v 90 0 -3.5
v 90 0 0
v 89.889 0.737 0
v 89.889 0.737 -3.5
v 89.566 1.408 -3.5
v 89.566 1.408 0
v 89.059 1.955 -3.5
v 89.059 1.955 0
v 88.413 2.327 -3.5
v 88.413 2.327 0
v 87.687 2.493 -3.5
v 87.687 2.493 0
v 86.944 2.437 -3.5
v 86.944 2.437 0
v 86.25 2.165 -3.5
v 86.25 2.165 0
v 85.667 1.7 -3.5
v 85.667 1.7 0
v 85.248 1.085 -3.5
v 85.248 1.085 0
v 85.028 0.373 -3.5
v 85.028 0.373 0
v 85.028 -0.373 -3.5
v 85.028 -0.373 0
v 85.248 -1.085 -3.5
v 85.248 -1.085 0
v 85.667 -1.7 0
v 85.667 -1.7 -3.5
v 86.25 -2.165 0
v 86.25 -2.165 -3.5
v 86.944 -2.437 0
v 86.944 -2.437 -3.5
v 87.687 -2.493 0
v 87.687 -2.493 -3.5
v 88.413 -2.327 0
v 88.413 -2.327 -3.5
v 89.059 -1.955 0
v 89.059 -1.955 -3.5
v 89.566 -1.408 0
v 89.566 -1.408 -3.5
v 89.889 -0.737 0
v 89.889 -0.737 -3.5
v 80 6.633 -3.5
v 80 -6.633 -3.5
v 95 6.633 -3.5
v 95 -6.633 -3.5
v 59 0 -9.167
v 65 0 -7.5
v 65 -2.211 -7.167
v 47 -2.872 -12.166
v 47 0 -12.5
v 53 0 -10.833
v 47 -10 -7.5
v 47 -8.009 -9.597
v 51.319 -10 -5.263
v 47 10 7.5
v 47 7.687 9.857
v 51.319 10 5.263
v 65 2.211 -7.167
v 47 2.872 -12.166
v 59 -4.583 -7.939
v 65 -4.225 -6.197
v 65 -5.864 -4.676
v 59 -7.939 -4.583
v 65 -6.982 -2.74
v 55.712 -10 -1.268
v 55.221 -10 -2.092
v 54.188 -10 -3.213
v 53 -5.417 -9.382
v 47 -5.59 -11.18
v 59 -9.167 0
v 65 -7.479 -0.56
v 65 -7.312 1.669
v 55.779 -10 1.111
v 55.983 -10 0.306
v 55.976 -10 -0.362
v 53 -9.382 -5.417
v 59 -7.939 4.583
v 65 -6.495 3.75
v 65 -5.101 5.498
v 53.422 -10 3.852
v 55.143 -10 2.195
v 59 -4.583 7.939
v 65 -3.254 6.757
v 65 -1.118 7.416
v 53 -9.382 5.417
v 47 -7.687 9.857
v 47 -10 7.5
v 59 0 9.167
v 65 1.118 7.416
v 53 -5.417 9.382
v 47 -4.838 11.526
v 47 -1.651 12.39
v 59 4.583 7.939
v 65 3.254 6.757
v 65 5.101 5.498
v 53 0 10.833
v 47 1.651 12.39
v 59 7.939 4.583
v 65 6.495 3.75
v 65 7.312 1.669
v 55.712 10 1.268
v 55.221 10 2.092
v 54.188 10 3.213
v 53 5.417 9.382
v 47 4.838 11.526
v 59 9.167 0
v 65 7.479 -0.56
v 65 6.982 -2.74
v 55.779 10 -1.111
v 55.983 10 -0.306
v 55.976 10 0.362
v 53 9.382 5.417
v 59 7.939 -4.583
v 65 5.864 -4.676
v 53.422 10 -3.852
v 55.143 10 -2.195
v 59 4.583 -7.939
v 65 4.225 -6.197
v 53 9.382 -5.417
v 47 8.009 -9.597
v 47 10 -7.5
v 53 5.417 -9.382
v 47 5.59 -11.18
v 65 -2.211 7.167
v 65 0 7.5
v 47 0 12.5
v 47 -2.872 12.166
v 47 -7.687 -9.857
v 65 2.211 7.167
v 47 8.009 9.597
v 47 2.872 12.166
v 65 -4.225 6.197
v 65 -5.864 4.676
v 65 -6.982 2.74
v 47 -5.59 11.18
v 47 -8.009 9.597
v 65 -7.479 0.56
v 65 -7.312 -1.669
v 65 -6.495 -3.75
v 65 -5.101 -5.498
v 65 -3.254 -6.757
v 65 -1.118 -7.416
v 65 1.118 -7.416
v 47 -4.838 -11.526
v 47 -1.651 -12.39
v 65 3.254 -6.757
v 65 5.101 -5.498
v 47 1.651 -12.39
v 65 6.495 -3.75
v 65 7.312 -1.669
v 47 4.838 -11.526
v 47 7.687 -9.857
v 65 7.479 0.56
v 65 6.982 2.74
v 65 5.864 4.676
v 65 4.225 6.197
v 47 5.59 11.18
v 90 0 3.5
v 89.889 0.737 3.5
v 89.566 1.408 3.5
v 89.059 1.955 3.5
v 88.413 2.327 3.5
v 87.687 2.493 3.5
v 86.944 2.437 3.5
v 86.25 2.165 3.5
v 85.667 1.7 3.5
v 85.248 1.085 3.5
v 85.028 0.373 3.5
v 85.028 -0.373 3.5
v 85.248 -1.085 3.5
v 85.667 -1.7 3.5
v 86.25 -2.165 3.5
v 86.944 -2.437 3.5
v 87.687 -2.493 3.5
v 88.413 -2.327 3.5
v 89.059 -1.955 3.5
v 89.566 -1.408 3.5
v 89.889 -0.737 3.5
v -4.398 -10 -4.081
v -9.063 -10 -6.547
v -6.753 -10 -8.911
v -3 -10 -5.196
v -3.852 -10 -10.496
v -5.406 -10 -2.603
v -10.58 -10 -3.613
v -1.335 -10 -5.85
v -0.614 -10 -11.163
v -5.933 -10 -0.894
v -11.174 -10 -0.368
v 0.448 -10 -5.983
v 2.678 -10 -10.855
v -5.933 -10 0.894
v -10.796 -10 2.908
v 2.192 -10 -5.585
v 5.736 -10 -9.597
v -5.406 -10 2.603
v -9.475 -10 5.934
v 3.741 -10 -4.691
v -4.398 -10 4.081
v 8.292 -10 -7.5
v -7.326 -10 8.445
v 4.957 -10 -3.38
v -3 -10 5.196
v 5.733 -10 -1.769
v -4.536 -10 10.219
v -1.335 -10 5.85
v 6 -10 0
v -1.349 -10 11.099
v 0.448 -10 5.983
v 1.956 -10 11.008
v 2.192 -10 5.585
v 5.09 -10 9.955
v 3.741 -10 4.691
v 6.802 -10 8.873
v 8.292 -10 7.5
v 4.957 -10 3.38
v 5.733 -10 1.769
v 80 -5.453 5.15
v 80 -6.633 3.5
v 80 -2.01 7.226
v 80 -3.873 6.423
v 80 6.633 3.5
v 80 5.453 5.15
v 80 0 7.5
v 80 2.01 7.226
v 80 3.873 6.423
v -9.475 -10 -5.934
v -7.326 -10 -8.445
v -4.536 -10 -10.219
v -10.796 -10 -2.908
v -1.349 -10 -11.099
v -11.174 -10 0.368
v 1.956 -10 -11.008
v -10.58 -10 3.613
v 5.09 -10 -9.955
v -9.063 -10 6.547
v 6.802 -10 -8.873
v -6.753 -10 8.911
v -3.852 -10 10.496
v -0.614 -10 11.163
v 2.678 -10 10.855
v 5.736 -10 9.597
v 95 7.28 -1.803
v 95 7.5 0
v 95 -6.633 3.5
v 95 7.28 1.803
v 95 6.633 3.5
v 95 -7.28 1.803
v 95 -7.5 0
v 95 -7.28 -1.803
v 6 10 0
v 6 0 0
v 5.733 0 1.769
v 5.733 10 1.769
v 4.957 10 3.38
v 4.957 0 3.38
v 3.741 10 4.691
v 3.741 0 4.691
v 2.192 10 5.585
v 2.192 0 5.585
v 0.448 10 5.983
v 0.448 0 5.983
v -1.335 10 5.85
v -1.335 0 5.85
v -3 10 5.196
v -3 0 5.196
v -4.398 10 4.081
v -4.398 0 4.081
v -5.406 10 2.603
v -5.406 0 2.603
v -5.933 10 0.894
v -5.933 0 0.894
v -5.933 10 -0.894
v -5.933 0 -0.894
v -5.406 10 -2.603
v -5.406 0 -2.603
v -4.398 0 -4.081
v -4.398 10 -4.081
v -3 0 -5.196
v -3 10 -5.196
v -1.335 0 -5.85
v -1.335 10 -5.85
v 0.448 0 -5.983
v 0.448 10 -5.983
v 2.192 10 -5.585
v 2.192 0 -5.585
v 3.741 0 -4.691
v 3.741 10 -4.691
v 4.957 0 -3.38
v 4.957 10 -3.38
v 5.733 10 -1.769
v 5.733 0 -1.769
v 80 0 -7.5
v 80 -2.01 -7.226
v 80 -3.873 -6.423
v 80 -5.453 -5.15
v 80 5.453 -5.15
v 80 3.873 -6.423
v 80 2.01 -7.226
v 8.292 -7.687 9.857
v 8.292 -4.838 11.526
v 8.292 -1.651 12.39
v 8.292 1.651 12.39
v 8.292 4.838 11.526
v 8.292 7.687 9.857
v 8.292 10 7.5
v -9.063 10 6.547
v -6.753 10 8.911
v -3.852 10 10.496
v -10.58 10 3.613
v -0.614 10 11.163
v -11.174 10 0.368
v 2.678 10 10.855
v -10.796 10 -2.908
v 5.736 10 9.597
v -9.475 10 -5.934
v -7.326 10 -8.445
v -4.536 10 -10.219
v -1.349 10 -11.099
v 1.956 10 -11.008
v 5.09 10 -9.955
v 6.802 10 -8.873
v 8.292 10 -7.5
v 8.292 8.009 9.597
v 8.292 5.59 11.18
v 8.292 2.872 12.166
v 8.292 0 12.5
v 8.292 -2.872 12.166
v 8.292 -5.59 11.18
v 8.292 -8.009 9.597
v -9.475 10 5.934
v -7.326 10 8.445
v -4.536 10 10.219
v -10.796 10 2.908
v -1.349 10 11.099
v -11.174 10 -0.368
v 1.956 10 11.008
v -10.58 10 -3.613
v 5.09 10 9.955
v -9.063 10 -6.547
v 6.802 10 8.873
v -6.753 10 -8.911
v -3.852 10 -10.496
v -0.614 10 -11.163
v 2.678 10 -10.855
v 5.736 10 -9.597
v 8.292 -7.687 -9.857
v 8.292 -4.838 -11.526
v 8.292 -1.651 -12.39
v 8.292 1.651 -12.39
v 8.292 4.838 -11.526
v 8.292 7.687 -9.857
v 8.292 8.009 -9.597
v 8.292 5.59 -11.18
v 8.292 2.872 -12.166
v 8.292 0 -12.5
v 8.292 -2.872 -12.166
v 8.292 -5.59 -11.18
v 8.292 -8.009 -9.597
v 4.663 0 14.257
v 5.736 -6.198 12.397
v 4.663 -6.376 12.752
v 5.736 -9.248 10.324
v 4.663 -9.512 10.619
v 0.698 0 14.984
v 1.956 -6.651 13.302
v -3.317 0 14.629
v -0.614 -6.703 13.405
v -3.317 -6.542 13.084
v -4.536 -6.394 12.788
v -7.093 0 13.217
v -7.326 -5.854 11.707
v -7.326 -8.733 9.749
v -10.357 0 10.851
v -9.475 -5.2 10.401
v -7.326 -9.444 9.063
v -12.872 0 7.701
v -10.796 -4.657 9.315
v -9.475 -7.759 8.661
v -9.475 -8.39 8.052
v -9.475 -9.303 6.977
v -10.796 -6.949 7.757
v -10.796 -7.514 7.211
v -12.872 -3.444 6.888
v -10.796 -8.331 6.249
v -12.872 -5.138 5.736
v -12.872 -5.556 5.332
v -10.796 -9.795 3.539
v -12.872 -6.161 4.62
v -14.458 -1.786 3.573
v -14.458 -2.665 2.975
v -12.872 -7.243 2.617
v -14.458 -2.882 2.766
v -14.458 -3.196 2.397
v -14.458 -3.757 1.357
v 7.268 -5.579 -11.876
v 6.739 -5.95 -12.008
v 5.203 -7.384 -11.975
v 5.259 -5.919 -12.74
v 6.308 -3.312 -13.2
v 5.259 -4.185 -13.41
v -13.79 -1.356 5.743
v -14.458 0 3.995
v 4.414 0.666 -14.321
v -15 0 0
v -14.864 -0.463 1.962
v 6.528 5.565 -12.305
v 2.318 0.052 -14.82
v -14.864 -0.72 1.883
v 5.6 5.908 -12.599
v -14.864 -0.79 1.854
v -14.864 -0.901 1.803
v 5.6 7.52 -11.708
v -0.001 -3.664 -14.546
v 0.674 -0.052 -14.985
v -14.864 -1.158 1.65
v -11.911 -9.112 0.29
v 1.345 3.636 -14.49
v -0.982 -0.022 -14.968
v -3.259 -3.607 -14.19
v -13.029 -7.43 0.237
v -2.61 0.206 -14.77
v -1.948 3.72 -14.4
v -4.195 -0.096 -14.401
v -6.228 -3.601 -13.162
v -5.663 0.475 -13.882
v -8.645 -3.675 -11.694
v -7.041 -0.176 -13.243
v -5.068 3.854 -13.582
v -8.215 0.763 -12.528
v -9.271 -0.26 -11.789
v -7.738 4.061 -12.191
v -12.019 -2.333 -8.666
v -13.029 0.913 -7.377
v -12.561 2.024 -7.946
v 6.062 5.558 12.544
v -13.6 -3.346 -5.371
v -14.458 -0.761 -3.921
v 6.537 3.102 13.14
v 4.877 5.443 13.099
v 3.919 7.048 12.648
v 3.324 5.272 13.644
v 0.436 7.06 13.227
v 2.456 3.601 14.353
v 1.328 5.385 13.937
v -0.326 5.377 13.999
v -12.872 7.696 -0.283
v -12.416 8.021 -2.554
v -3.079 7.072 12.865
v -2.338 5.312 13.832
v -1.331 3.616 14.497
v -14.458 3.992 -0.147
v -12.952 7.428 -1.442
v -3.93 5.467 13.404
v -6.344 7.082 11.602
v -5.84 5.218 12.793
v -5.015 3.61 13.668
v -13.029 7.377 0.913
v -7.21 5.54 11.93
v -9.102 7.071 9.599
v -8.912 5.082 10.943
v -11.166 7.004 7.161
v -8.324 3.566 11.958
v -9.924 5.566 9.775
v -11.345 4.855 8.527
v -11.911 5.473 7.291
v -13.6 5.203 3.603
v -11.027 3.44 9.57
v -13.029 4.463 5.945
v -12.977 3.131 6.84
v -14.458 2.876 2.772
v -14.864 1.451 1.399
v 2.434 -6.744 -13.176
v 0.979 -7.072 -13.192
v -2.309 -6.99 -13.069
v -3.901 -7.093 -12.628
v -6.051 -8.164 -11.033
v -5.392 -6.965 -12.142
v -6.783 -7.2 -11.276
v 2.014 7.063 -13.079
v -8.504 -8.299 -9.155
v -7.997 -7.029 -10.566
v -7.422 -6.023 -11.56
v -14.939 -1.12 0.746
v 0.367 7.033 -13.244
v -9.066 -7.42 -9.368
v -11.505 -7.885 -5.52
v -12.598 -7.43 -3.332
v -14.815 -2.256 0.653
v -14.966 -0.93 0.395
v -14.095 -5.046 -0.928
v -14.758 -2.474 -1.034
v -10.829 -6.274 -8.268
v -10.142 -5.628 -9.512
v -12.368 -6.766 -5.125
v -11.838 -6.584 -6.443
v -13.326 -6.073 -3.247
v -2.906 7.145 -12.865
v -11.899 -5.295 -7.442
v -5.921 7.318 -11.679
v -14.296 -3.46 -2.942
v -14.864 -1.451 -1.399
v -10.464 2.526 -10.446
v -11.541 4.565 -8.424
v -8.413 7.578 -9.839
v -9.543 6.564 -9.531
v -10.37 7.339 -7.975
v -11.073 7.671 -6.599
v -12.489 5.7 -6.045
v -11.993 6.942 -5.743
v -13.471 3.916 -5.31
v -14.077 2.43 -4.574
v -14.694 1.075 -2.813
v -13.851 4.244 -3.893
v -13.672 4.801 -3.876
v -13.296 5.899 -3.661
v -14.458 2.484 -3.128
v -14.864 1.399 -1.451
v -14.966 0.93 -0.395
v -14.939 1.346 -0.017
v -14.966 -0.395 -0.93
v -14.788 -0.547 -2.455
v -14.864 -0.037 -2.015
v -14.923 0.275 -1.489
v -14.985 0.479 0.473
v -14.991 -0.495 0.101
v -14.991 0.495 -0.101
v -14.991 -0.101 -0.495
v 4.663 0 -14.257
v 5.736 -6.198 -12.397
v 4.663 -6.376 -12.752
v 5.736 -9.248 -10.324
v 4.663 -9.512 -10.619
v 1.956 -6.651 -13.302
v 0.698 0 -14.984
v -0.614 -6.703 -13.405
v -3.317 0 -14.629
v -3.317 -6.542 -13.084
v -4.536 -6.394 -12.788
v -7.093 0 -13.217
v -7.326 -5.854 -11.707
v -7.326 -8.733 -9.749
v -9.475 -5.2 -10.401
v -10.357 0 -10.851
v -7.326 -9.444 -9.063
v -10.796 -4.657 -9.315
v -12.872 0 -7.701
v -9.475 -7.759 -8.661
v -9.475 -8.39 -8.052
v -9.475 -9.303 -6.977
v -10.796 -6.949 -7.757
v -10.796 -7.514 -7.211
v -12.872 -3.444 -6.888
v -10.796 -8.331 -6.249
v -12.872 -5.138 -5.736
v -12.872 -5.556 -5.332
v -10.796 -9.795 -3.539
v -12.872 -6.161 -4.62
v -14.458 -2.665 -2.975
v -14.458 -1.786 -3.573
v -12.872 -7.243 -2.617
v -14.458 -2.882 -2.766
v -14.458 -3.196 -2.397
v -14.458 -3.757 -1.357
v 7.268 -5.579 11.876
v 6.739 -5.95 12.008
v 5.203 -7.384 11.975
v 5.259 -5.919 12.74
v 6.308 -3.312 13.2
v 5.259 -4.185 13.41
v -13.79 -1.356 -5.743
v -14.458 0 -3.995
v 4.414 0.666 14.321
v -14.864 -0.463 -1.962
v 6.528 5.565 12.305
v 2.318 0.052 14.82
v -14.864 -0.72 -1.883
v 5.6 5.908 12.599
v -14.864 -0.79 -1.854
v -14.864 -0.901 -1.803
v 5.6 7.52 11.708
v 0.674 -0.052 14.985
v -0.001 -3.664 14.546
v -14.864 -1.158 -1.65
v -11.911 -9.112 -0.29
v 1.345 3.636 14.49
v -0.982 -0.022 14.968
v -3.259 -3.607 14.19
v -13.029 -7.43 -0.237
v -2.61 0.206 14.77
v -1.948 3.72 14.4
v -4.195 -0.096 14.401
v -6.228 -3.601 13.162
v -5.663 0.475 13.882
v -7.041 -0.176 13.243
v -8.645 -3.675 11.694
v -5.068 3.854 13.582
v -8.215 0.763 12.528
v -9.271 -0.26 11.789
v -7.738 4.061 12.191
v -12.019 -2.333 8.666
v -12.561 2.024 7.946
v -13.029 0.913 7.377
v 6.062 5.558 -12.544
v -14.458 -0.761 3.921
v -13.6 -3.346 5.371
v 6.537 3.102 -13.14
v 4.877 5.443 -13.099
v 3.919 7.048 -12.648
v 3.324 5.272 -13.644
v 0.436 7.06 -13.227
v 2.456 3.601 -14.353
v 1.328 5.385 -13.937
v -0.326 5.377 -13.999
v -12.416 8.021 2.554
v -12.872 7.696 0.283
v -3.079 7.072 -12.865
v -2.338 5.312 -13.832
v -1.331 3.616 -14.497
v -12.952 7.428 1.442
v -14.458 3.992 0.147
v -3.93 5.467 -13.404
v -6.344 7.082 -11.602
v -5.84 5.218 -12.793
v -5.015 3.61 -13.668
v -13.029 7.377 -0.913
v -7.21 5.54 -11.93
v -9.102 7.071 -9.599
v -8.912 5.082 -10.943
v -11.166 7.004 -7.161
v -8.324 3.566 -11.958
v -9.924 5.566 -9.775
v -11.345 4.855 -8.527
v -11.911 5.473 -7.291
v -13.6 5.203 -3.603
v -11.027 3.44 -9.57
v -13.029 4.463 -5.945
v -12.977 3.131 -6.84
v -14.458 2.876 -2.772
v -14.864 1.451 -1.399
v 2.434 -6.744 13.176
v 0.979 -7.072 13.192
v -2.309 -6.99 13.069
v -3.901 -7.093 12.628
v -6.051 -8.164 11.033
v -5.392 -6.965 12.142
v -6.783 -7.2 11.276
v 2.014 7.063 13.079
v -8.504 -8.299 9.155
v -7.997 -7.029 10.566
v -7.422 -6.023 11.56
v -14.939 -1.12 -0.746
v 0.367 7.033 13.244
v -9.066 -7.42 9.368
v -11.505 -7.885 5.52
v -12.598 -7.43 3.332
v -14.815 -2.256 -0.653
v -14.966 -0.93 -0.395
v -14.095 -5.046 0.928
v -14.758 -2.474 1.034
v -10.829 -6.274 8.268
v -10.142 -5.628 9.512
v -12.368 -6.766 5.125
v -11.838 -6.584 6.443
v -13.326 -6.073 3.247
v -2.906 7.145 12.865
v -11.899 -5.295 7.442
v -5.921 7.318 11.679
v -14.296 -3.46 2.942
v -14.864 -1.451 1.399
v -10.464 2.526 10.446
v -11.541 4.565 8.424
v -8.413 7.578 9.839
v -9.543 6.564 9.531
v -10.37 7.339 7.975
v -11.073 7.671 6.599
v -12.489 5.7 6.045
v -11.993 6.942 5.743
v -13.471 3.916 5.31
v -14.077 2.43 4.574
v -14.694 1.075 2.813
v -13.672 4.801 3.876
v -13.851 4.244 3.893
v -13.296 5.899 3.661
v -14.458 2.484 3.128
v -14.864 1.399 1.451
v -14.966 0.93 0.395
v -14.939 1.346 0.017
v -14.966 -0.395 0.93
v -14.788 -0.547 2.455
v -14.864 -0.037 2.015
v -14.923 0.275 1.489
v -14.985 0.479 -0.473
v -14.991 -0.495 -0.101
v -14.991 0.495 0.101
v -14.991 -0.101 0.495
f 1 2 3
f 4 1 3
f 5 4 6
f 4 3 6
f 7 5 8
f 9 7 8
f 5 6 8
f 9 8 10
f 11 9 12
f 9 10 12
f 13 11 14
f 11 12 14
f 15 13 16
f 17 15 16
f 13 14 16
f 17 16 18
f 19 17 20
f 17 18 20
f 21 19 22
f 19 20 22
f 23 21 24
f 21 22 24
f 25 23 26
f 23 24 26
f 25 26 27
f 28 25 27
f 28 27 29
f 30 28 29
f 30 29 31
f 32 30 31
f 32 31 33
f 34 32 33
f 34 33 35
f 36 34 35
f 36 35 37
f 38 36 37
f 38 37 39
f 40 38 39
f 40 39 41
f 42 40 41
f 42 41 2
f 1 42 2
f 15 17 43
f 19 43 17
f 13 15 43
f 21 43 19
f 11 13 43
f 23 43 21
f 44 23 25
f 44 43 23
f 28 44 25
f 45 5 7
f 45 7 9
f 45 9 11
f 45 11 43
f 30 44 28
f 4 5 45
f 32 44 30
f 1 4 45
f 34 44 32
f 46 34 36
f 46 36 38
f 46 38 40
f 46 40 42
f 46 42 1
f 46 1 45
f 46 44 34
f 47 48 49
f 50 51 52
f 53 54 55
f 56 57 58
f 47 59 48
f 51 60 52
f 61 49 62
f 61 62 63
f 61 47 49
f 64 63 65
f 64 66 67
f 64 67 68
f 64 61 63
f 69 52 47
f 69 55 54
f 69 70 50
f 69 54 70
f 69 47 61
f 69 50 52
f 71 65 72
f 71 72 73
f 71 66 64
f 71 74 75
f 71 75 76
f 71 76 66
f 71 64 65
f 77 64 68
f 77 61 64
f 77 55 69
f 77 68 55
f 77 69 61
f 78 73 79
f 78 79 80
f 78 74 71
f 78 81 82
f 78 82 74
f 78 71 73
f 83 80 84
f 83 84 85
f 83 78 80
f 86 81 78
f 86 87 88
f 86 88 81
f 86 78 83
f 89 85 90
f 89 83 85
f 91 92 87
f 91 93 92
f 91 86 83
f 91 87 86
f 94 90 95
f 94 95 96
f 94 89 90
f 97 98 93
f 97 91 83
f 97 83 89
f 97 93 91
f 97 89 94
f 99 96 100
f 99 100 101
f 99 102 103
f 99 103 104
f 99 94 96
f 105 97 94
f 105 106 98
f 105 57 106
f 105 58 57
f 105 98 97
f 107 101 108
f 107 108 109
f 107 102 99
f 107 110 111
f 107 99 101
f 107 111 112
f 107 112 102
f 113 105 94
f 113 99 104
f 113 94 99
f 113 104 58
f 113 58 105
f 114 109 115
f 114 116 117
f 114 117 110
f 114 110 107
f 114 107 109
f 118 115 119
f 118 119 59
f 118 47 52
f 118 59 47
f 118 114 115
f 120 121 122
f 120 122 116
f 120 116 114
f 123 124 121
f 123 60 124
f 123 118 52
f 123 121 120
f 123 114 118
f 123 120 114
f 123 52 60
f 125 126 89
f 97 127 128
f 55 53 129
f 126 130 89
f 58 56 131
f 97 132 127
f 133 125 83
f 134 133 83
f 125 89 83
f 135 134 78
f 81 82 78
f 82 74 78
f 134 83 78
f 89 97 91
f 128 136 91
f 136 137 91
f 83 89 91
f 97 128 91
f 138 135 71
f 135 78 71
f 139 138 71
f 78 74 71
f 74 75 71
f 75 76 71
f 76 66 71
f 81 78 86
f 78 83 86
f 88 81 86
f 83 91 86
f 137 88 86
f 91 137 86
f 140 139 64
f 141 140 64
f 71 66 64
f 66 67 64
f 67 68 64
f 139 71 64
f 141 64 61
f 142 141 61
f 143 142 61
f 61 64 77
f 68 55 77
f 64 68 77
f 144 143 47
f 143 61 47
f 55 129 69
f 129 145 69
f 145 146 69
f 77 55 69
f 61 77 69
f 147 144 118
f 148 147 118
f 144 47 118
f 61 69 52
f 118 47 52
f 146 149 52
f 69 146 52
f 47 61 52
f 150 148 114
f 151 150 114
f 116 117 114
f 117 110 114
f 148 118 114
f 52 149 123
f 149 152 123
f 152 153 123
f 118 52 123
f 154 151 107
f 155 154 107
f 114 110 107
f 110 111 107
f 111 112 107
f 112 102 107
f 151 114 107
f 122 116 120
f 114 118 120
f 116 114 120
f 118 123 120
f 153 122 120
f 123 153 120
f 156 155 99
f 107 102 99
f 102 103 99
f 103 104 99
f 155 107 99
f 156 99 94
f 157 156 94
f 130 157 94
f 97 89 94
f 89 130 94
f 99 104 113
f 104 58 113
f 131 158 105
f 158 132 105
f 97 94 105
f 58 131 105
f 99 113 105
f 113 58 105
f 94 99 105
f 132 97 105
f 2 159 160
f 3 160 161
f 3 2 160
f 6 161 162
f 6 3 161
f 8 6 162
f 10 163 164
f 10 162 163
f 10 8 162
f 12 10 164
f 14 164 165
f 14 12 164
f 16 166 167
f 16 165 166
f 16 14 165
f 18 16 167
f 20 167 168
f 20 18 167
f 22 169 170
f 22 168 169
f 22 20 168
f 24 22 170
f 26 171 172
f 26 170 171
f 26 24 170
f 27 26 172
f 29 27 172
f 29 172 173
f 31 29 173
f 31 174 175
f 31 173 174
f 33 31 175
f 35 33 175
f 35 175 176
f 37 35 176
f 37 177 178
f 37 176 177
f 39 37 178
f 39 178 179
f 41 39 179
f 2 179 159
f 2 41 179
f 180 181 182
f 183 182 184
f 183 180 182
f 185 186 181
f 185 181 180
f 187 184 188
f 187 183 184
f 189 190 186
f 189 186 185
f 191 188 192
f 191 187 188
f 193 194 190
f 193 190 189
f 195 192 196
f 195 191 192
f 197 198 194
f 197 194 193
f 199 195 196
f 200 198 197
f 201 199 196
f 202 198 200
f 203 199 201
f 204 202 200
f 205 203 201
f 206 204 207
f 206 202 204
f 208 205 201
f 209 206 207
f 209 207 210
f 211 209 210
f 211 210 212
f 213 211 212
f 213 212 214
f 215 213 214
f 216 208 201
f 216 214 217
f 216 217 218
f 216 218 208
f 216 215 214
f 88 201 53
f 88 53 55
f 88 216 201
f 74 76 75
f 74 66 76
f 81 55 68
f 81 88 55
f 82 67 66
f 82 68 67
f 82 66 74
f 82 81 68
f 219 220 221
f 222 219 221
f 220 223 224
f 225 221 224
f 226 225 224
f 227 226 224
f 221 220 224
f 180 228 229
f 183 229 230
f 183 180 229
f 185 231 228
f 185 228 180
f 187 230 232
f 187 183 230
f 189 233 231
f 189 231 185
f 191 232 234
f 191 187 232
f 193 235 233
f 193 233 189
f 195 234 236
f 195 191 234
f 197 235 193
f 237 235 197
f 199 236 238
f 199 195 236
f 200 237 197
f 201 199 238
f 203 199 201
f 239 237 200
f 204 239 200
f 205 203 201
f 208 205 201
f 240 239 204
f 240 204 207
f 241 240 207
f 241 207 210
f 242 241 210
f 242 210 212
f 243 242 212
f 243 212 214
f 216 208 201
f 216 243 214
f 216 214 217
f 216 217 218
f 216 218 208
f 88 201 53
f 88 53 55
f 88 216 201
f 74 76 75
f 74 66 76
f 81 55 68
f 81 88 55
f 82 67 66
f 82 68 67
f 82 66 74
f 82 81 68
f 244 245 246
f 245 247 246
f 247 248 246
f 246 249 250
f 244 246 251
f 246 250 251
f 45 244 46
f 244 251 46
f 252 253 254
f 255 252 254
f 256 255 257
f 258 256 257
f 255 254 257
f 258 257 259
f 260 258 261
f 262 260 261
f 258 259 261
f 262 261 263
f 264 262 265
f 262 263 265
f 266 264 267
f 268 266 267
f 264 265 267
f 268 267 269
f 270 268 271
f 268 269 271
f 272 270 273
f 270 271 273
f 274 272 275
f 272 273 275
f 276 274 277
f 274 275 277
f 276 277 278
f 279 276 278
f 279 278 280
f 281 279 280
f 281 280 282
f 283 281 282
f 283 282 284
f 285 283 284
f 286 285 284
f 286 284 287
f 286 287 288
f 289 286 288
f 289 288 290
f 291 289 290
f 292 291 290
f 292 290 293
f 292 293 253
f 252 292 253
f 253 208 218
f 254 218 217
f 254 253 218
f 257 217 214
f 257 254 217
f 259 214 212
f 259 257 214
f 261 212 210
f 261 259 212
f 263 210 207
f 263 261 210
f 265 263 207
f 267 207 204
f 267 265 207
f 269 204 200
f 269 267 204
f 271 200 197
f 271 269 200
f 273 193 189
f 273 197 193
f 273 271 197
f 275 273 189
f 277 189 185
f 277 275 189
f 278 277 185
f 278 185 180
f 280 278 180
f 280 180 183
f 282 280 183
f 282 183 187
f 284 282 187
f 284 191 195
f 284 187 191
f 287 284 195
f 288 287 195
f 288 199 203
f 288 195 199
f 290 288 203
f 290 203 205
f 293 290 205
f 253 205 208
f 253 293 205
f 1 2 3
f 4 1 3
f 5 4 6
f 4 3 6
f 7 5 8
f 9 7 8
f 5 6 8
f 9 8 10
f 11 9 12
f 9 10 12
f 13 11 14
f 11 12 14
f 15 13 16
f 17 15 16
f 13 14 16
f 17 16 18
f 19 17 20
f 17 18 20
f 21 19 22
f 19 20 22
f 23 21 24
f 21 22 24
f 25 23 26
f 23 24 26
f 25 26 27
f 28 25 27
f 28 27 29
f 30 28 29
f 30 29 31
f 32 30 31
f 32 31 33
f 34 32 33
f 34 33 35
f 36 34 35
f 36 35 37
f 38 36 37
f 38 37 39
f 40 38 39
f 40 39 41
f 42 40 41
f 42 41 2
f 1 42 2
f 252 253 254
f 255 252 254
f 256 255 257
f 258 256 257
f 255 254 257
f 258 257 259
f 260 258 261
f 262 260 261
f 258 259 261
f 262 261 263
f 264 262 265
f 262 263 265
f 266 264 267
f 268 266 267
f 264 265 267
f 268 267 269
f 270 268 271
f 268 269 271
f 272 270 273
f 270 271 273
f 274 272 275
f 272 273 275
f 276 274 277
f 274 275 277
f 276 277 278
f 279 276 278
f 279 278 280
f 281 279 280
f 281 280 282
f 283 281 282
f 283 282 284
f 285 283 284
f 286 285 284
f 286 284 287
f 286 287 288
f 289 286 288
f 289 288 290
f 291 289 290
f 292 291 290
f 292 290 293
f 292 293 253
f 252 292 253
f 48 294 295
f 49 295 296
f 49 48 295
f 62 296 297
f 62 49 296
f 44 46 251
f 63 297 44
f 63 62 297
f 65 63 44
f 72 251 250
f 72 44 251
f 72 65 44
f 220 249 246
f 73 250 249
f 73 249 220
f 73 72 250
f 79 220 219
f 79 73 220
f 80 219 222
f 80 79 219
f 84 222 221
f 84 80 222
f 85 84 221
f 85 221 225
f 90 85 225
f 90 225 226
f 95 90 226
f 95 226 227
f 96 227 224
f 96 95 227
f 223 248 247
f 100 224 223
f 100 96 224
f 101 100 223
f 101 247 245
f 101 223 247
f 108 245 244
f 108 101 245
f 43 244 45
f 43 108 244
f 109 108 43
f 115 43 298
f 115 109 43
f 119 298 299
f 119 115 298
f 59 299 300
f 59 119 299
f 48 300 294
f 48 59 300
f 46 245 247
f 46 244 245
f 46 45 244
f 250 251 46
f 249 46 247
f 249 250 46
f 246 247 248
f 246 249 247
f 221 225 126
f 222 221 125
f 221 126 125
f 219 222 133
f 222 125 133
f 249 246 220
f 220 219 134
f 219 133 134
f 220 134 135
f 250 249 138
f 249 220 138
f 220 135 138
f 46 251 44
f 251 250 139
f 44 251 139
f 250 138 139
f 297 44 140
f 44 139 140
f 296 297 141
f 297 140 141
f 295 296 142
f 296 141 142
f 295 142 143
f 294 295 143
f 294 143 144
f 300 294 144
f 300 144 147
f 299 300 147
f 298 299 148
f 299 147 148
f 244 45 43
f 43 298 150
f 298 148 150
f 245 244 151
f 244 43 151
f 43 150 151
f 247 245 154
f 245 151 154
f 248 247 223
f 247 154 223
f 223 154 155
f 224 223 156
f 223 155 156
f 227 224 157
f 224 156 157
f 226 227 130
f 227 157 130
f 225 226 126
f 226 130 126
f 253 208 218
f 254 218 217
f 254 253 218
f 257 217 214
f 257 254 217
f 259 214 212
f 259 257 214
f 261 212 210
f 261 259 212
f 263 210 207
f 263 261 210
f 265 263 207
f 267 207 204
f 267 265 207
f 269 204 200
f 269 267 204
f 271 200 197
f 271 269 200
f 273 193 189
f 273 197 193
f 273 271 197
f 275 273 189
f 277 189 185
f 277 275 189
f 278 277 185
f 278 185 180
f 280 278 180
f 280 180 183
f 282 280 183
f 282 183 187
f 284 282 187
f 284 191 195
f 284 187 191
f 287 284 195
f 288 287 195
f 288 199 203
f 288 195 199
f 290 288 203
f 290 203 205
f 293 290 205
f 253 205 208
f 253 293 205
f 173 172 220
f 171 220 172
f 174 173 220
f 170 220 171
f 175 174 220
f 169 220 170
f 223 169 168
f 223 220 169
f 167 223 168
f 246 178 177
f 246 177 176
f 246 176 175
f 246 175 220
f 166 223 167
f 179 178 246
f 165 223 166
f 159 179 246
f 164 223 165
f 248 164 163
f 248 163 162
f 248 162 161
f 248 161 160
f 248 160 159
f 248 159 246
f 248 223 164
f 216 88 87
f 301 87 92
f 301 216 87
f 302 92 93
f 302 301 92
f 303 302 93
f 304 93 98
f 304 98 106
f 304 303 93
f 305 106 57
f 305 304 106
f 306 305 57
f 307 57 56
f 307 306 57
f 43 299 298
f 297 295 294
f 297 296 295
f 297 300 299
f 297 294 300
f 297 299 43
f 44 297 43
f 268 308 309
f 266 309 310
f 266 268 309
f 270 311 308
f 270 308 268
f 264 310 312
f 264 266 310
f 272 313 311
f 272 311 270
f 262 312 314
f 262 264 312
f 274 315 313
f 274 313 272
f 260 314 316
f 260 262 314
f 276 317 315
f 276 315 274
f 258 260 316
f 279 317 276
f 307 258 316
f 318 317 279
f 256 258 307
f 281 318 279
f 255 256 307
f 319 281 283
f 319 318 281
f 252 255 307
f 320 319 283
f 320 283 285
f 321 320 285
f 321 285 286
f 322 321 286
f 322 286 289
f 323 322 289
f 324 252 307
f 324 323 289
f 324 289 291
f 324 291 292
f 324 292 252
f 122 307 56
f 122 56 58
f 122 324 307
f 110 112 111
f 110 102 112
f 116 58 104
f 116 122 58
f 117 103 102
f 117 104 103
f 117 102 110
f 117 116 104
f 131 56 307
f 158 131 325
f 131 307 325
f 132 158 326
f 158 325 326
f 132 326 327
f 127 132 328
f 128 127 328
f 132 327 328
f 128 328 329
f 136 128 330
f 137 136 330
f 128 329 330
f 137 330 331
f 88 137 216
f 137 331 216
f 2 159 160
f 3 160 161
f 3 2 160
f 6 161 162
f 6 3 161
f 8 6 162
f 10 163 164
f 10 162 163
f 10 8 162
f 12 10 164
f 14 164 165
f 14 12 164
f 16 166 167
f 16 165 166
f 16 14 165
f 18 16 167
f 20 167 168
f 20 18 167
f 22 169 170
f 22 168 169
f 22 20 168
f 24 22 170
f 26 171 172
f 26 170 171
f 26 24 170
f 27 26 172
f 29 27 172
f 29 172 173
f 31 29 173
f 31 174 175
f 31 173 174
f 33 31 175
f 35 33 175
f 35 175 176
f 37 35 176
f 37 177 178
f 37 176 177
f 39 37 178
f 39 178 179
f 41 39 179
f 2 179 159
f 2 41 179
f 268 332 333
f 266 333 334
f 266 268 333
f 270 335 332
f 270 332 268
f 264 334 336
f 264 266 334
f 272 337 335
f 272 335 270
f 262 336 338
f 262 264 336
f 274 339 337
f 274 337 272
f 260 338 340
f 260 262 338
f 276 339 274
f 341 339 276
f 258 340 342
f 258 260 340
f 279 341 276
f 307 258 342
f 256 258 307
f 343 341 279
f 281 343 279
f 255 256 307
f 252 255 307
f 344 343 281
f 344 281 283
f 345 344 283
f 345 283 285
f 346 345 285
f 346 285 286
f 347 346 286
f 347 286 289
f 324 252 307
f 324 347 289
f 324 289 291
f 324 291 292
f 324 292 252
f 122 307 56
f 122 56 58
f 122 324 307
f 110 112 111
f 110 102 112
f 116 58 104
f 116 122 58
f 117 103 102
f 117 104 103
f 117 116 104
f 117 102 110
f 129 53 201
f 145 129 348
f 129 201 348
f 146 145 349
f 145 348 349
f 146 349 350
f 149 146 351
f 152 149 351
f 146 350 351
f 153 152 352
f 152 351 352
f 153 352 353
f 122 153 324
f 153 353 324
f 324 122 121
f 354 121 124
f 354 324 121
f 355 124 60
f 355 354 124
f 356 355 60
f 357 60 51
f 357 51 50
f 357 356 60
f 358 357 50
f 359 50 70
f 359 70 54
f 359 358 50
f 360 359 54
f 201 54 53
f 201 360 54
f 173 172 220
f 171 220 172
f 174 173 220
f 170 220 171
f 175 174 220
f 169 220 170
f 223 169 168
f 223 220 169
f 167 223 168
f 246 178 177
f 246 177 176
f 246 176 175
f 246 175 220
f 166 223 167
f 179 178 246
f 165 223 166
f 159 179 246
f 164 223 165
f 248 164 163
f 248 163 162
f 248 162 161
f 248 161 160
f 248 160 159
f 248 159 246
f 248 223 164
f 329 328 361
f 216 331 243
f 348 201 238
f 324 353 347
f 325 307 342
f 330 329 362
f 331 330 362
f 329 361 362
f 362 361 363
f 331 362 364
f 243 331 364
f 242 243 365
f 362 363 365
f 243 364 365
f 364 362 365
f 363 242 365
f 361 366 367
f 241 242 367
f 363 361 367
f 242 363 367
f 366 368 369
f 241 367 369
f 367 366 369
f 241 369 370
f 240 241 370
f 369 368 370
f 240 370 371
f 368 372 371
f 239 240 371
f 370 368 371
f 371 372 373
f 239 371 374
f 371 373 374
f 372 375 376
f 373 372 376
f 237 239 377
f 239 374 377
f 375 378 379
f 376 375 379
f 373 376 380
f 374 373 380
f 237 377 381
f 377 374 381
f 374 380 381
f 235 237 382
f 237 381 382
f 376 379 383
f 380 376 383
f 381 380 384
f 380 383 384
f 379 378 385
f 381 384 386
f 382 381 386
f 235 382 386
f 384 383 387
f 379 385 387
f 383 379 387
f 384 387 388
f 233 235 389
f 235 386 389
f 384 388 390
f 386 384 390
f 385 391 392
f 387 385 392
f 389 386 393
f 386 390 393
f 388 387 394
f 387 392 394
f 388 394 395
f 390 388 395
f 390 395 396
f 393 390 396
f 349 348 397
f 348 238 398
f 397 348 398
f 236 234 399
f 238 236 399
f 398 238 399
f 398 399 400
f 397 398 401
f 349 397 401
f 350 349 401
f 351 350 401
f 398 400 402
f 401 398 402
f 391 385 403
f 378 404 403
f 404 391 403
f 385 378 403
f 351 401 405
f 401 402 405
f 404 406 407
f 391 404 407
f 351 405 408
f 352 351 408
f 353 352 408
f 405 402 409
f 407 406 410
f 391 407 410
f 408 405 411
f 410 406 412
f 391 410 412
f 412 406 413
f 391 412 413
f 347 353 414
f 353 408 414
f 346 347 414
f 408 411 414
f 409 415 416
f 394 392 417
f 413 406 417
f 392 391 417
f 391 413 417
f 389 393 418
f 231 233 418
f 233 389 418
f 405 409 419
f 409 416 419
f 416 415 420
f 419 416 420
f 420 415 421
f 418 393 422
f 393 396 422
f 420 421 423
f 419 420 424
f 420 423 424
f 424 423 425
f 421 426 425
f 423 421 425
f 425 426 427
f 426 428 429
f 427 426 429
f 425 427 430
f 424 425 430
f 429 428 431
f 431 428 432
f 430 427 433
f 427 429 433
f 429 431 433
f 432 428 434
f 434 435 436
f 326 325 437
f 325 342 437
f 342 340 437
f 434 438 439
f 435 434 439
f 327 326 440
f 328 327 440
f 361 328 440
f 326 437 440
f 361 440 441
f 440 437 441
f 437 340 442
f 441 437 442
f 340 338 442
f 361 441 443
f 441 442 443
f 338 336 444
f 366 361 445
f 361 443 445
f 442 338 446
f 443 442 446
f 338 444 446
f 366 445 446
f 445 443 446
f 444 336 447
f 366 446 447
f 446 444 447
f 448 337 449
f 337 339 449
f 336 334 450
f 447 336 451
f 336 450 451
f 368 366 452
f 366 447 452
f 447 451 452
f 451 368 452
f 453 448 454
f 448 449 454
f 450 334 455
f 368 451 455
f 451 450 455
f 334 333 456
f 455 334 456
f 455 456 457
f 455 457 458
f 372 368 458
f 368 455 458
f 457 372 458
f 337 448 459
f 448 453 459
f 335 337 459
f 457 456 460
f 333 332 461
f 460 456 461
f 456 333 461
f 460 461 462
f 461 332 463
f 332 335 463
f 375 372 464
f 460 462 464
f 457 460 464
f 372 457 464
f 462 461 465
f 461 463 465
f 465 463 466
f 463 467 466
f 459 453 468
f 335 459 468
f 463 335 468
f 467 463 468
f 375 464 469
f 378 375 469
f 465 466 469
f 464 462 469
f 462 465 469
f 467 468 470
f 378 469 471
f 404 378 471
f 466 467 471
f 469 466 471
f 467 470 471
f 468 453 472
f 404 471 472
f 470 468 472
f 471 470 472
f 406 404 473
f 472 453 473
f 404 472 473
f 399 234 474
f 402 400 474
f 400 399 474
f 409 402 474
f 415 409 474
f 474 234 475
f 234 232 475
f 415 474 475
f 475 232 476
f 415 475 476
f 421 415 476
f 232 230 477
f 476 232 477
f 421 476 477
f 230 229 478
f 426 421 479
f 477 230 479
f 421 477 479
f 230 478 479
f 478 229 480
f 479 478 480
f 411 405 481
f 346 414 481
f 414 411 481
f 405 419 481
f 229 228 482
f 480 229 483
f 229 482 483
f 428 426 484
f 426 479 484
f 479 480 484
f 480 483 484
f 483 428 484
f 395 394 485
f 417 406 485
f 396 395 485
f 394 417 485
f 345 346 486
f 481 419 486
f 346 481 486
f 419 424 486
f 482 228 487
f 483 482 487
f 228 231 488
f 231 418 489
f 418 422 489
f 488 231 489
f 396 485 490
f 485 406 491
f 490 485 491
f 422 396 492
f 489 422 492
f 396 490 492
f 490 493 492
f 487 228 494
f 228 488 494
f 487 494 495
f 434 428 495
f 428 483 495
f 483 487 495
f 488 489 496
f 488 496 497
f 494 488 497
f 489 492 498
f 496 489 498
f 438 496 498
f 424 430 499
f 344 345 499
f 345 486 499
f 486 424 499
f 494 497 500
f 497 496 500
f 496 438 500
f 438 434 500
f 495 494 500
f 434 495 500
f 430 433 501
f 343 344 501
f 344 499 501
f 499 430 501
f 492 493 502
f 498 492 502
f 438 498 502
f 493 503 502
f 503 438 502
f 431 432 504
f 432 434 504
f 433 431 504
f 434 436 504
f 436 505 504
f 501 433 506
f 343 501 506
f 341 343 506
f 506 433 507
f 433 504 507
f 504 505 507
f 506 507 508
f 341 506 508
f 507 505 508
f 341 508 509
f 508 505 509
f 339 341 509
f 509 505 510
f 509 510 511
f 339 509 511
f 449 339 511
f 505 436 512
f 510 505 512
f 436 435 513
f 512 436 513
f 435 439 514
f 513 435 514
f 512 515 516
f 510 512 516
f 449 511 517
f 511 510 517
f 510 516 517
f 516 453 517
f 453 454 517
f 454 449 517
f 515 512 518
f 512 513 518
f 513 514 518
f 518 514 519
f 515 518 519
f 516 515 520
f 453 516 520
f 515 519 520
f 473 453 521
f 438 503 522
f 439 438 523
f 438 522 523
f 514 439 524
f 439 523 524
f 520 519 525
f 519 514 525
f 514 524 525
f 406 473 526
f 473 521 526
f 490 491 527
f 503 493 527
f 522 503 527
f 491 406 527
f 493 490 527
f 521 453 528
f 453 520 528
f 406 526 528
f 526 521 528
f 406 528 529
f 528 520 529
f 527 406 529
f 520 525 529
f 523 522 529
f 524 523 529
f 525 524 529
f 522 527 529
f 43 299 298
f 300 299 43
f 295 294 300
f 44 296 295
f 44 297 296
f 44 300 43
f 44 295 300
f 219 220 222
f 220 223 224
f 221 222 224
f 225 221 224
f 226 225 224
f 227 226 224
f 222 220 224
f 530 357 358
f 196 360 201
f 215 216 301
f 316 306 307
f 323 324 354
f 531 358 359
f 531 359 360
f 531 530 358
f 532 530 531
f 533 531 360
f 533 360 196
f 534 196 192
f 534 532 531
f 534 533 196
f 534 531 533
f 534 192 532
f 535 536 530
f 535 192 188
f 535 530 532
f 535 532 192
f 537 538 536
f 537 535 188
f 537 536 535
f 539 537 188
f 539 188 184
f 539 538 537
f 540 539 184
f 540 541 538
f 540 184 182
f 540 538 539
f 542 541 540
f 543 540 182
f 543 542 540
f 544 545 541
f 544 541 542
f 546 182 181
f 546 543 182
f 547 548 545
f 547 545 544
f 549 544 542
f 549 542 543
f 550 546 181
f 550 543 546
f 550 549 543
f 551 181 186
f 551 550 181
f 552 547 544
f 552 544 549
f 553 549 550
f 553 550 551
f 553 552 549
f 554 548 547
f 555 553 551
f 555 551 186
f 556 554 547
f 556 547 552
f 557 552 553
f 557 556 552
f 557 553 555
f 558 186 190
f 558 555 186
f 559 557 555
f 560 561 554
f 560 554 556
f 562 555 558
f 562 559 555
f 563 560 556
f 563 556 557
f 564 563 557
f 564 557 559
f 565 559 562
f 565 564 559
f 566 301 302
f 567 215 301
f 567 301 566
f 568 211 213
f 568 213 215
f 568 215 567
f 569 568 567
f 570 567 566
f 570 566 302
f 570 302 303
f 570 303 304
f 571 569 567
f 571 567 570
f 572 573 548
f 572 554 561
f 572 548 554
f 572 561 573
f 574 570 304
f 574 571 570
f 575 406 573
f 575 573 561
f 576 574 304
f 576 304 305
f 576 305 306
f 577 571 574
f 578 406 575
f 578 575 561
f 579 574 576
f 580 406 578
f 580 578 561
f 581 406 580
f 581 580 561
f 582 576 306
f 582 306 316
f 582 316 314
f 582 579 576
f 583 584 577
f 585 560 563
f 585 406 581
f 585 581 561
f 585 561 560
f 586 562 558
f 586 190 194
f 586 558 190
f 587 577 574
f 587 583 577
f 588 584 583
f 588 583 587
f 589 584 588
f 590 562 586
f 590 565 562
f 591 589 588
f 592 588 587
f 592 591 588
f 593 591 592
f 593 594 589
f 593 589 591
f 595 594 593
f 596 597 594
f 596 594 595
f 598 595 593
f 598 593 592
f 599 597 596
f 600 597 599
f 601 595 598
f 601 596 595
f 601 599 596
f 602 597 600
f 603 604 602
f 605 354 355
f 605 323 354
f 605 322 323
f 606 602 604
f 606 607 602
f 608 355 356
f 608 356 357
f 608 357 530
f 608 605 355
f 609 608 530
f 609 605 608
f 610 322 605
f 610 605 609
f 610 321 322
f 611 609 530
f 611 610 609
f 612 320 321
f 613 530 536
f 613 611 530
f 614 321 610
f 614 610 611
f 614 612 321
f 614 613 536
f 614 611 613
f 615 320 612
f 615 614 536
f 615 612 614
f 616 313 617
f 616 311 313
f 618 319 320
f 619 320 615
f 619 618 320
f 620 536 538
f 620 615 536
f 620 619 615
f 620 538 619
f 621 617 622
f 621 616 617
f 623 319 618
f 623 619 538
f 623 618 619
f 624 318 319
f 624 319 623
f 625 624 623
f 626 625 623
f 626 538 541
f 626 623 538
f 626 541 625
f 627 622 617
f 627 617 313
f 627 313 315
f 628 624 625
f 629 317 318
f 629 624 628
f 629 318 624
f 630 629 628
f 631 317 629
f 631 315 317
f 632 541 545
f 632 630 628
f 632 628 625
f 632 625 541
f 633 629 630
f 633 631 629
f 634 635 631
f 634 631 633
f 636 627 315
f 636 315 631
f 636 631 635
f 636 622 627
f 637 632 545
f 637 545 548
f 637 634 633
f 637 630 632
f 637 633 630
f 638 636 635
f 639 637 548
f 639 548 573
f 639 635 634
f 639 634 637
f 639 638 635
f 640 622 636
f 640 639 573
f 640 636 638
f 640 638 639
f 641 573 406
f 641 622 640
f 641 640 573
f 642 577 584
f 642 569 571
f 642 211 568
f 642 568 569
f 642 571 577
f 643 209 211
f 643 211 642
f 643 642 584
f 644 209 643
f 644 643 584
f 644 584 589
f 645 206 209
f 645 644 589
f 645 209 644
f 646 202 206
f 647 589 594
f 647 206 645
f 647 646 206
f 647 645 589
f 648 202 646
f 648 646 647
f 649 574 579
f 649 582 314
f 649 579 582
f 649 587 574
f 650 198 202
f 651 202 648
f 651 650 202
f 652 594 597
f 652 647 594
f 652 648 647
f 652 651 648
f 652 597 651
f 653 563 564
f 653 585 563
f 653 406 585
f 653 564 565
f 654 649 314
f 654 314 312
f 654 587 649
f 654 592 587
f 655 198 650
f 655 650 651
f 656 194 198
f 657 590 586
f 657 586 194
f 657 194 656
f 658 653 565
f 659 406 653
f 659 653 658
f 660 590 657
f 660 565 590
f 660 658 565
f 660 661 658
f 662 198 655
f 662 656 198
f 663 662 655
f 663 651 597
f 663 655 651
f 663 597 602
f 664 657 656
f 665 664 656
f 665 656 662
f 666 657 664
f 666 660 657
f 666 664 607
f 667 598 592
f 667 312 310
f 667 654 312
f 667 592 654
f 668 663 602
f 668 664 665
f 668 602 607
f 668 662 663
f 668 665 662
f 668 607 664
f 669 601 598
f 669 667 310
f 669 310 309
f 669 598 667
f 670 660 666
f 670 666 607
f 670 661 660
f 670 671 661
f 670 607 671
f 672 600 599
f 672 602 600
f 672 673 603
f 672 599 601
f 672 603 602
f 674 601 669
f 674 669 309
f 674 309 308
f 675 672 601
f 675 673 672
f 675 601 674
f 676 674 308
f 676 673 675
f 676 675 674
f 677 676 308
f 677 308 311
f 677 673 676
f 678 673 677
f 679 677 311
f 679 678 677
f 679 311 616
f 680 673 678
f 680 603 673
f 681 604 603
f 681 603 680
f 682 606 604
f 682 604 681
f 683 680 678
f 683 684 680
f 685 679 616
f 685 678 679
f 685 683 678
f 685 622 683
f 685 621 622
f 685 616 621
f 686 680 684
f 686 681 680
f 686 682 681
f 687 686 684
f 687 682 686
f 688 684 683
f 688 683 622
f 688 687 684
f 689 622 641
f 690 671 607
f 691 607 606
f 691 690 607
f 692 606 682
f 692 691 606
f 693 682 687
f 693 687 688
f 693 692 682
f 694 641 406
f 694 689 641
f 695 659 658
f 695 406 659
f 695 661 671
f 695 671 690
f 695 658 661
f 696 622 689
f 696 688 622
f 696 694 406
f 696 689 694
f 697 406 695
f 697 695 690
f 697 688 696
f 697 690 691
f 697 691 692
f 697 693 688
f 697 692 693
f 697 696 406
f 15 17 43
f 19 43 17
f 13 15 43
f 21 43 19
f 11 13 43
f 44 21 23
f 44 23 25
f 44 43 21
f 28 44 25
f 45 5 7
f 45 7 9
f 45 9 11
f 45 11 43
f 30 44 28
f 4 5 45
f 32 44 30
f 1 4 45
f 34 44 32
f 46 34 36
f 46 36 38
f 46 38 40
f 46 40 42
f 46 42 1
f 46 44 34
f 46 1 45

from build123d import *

# Parameters (mm, degrees)
F3_R     = 6
F3_W     = 15
F3_H     = 4
F4_DEPTH = 25
F5_R     = 2.5
F5_W     = 83.634722
F5_H     = 6.064514
F5_W_2   = 83.892783
F5_H_2   = 8.140588
F6_DEPTH = 25


with BuildPart() as f1:
    # F0 (on Front) → F1 (revolve)
    with BuildSketch(Plane.XZ):
        with BuildLine():
            Line((47, 12.5), (8.291562, 12.5))
            ThreePointArc((8.291562, 12.5), (-7.093186, 13.21691), (-15, 0))
            Line((-15, 0), (95, 0))
            Line((95, 0), (95, 7.5))
            Line((95, 7.5), (80, 7.5))
            Line((80, 7.5), (65, 7.5))
            Line((65, 7.5), (47, 12.5))
        make_face()
    revolve(axis=Axis((42.174323, 0, 0), (1, 0, 0)))


with BuildPart() as f2_1:
    # F2: instance of F1
    add(f1.part.mirror(Plane.XY))


with BuildPart() as f4_tool:
    # F3 (on Front) → F4 (new body, symmetric)
    with BuildSketch(Plane.XZ):
        Circle(F3_R)
        with Locations((87.5, 5.5)):
            Rectangle(F3_W, F3_H)
        with Locations((87.5, -5.5)):
            Rectangle(F3_W, F3_H)
    extrude(amount=F4_DEPTH, both=True)


with BuildPart() as f1_1:
    add(f1.part)

    # F4: cut by f4_tool
    add(f4_tool.part, mode=Mode.SUBTRACT)


with BuildPart() as f2_1_1:
    add(f2_1.part)

    # F4: cut by f4_tool
    add(f4_tool.part, mode=Mode.SUBTRACT)


with BuildPart() as f6_tool:
    # F5 (on Top) → F6 (new body, symmetric)
    with BuildSketch(Plane.XY):
        with Locations((87.5, 0)):
            Circle(F5_R)
        with Locations((25.832985, 13.032257)):
            Rectangle(F5_W, F5_H)
        with Locations((25.703955, -14.070294)):
            Rectangle(F5_W_2, F5_H_2)
    extrude(amount=F6_DEPTH, both=True)


with BuildPart() as f1_2:
    add(f1_1.part)

    # F6: cut by f6_tool
    add(f6_tool.part, mode=Mode.SUBTRACT)


with BuildPart() as f2_1_2:
    add(f2_1_1.part)

    # F6: cut by f6_tool
    add(f6_tool.part, mode=Mode.SUBTRACT)


solid = Compound([f1_2.part, f2_1_2.part])
